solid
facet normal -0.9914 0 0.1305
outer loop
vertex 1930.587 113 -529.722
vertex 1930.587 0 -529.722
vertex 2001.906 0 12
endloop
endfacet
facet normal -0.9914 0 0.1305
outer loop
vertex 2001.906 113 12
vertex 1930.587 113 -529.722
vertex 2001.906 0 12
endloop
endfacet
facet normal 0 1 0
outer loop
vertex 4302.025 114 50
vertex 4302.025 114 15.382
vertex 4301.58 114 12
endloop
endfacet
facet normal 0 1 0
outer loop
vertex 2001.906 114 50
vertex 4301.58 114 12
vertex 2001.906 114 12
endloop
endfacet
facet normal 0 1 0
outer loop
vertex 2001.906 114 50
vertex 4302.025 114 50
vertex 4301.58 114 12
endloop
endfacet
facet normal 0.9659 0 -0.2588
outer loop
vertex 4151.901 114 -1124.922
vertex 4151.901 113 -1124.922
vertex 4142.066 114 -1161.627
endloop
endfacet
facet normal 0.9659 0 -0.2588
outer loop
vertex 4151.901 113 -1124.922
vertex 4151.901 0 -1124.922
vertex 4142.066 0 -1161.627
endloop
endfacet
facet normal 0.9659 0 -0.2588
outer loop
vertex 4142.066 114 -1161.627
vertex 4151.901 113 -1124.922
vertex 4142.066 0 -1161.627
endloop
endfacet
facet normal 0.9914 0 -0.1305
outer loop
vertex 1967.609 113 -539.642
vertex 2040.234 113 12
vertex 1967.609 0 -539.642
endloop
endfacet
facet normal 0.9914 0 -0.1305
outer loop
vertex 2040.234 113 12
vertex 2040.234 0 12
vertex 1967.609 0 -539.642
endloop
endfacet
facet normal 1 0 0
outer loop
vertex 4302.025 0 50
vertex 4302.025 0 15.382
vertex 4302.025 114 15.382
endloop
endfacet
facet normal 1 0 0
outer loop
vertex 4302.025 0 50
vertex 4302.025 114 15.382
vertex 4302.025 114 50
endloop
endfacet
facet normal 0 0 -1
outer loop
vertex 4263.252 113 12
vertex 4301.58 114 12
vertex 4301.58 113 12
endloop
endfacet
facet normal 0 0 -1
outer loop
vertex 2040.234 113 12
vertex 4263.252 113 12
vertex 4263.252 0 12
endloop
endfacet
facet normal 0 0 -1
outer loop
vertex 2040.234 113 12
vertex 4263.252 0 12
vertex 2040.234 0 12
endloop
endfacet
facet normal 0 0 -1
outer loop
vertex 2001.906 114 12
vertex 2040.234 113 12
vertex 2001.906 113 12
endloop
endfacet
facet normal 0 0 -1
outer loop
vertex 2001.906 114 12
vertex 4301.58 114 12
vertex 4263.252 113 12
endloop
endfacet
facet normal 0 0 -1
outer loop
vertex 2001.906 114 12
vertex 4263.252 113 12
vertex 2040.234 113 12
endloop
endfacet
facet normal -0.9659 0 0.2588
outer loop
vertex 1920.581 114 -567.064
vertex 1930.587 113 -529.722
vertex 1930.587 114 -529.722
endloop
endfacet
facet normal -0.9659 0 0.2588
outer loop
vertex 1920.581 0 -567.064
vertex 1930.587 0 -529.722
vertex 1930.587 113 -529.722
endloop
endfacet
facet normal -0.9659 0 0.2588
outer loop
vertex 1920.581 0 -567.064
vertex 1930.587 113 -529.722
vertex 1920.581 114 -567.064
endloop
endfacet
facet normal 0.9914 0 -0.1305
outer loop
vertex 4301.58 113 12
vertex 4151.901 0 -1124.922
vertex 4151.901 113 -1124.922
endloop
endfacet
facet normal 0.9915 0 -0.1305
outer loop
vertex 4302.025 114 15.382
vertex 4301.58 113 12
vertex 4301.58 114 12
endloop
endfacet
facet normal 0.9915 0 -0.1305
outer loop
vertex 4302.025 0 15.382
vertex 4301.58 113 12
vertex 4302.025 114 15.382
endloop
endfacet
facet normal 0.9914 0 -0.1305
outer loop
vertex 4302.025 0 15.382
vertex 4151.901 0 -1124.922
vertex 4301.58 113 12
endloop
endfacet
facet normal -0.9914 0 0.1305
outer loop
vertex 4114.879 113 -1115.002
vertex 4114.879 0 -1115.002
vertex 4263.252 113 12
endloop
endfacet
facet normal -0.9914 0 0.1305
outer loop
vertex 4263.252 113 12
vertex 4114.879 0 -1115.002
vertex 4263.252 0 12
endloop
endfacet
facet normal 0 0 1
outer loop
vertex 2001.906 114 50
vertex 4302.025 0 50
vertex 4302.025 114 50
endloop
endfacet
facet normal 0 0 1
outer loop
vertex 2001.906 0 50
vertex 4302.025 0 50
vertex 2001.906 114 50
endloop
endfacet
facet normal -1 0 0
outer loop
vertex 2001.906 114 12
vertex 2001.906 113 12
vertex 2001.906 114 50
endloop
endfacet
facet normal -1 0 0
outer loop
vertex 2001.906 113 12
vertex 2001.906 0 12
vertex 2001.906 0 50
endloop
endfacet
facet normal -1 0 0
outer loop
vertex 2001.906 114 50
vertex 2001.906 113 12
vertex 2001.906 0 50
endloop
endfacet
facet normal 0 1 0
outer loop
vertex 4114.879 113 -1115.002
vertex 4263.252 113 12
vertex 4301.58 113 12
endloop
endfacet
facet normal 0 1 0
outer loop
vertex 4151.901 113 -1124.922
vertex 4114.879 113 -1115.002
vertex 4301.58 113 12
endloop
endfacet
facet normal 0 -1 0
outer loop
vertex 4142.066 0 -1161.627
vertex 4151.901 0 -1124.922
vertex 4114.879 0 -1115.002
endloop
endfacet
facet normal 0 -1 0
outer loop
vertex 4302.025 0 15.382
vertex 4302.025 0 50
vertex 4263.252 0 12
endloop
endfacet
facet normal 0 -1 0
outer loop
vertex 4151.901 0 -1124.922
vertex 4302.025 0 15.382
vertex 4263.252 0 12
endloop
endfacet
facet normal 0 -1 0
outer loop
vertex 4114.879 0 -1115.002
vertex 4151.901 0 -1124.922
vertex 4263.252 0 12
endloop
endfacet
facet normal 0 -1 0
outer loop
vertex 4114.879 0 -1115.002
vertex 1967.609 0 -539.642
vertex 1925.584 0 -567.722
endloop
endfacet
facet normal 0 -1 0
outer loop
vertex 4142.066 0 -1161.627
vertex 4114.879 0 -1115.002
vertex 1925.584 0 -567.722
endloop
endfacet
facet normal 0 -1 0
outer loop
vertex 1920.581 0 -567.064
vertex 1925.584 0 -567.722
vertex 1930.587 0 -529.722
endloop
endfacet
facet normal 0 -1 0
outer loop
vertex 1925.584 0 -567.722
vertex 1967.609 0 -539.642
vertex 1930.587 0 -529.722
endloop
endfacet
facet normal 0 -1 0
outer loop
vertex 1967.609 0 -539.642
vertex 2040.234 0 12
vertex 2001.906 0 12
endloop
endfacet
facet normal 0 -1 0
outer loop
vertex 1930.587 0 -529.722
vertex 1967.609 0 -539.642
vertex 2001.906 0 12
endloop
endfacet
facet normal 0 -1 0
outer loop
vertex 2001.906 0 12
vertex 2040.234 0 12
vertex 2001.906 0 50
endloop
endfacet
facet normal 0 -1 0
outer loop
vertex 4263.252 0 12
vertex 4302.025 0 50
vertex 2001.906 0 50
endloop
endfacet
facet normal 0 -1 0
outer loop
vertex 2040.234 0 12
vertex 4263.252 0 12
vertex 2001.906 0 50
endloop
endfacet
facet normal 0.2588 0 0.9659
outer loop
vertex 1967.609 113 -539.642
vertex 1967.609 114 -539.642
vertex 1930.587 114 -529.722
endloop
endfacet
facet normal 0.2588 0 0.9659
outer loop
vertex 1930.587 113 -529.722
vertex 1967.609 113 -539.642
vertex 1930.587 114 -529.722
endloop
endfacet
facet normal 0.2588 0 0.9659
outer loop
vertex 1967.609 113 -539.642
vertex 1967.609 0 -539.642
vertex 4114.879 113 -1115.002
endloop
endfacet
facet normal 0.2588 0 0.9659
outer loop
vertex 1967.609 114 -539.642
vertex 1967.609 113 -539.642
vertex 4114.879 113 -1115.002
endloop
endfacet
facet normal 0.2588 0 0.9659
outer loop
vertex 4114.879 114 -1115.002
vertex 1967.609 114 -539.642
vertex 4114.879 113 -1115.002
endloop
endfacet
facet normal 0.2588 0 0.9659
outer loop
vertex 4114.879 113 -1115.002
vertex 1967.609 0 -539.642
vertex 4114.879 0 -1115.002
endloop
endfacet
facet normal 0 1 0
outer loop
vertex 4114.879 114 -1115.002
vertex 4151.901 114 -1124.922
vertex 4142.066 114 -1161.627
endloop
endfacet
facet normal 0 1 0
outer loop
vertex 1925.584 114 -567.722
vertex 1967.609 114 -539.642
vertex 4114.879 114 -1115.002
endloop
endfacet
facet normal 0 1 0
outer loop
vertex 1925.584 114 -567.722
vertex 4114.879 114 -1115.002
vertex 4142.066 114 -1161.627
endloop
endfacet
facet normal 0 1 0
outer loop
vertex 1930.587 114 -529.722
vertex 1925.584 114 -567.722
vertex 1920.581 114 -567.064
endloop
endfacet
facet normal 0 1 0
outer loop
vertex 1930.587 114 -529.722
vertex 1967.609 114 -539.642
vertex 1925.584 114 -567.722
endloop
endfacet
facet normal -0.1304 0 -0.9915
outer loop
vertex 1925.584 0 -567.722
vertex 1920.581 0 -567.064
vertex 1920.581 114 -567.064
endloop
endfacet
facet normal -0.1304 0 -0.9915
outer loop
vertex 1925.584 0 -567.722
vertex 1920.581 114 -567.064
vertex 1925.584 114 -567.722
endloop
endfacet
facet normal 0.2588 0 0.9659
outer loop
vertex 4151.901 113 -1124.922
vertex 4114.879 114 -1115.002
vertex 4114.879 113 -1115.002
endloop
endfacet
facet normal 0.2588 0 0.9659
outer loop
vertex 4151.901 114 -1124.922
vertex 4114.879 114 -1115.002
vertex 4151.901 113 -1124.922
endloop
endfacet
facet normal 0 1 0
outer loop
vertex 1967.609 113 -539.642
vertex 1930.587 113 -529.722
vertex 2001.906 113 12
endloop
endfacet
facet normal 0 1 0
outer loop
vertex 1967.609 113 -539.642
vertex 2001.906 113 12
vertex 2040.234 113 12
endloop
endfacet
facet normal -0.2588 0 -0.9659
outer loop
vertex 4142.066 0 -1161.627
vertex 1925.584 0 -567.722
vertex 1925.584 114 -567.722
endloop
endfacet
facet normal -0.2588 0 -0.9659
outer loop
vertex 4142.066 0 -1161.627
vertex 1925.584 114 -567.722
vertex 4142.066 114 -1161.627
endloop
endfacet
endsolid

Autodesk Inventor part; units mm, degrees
ref_plane "YZ Plane" through (0, 0, 0) normal (1, 0, 0) x (0, 1, 0)
ref_plane "XZ Plane" through (0, 0, 0) normal (0, 1, 0) x (-1, 0, 0)
ref_plane "XY Plane" through (0, 0, 0) normal (0, 0, 1) x (1, 0, 0)
sketch "Sketch1" plane through (0, 0, 0) normal (0, 1, 0) x (-1, 0, 0)
  line L0 (0, 0) -> (-4153.4811, -1112.9219) construction
  line L1 (0, 0) -> (4300, 0) construction
  line L2 (-4300, 0) -> (-4200, 0) construction
  line L3 (-2006.9086, 50) -> (-4302.025, 50)
  line L4 (-4153.4811, -1112.9219) -> (-3780.7254, -1112.9219) construction
  line L5 (-1925.5839, -567.7225) -> (-4142.0661, -1161.6271)
  line L6 (-4151.9012, -1124.9219) -> (-4302.025, 15.3817)
  line L7 (-1930.5867, -529.7225) -> (-2001.9058, 12)
  line L8 (-4263.2519, 12) -> (-2040.2337, 12)
  line L9 (-2040.2337, 12) -> (-1967.6086, -539.6424)
  line L10 (-1967.6086, -539.6424) -> (-4114.8793, -1115.0019)
  line L11 (-4114.8793, -1115.0019) -> (-4263.2519, 12)
  line L12 (-2006.9086, 50) -> (-2001.9058, 50)
  line L13 (-2040.2337, 12) -> (-1982.3344, 12) construction
  line L14 (-2001.9058, 12) -> (-2001.9058, 50)
  line L15 (-1967.6086, -539.6424) -> (-1881.5519, -516.5836) construction
  line L16 (-1930.5867, -529.7225) -> (-1920.5811, -567.0638)
  line L17 (-1920.5811, -567.0638) -> (-1925.5839, -567.7225)
  line L18 (-4263.2519, 12) -> (-4318.8305, 12) construction
  line L19 (-4302.025, 15.3817) -> (-4302.025, 50)
  line L20 (-4114.8793, -1115.0019) -> (-4170.6932, -1129.9572) construction
  line L21 (-4151.9012, -1124.9219) -> (-4142.0661, -1161.6271)
  dimension "d0" = 4300
  dimension "d1" = 4300
  dimension "d2" = 165
  dimension "d7" = 50
  dimension "d11" = 38
extrude "Extrusion2" add sketch "Sketch1" along normal blind 114
sketch "Sketch2" plane through (0, 114, 0) normal (0, 1, 0) x (1, 0, 0)
  line L0 (2040.2337, -12) -> (1967.6086, 539.6424) projected
  line L1 (2001.9058, -50) -> (4302.025, -50) projected
  line L2 (4142.0661, 1161.6271) -> (1925.5839, 567.7225) projected
  line L3 (1925.5839, 567.7225) -> (2001.9058, -12) projected
  line L4 (1967.6086, 539.6424) -> (1930.5867, 529.7225)
  line L5 (2040.2337, -12) -> (2001.9058, -12)
  point P0 (2006.9086, -50)
  point P1 (0, 0)
extrude "Extrusion3" cut sketch "Sketch2" against normal blind 1
sketch "Sketch7" plane through (0, 114, 0) normal (0, 1, 0) x (1, 0, 0)
  line L0 (4114.8793, 1115.0019) -> (4263.2519, -12) projected
  line L1 (4302.025, -50) -> (4302.025, -15.3817) projected
  line L2 (4302.025, -15.3817) -> (4151.9012, 1124.9219) projected
  line L3 (1920.5811, 567.0638) -> (1930.5867, 529.7225) projected
  line L4 (4263.2519, -12) -> (4301.5798, -12)
  line L5 (4114.8793, 1115.0019) -> (4151.9012, 1124.9219)
  point P0 (0, 0)
extrude "Extrusion6" cut sketch "Sketch7" against normal blind 1
properties part number "panelBflat" material "Wood (Birch)"
